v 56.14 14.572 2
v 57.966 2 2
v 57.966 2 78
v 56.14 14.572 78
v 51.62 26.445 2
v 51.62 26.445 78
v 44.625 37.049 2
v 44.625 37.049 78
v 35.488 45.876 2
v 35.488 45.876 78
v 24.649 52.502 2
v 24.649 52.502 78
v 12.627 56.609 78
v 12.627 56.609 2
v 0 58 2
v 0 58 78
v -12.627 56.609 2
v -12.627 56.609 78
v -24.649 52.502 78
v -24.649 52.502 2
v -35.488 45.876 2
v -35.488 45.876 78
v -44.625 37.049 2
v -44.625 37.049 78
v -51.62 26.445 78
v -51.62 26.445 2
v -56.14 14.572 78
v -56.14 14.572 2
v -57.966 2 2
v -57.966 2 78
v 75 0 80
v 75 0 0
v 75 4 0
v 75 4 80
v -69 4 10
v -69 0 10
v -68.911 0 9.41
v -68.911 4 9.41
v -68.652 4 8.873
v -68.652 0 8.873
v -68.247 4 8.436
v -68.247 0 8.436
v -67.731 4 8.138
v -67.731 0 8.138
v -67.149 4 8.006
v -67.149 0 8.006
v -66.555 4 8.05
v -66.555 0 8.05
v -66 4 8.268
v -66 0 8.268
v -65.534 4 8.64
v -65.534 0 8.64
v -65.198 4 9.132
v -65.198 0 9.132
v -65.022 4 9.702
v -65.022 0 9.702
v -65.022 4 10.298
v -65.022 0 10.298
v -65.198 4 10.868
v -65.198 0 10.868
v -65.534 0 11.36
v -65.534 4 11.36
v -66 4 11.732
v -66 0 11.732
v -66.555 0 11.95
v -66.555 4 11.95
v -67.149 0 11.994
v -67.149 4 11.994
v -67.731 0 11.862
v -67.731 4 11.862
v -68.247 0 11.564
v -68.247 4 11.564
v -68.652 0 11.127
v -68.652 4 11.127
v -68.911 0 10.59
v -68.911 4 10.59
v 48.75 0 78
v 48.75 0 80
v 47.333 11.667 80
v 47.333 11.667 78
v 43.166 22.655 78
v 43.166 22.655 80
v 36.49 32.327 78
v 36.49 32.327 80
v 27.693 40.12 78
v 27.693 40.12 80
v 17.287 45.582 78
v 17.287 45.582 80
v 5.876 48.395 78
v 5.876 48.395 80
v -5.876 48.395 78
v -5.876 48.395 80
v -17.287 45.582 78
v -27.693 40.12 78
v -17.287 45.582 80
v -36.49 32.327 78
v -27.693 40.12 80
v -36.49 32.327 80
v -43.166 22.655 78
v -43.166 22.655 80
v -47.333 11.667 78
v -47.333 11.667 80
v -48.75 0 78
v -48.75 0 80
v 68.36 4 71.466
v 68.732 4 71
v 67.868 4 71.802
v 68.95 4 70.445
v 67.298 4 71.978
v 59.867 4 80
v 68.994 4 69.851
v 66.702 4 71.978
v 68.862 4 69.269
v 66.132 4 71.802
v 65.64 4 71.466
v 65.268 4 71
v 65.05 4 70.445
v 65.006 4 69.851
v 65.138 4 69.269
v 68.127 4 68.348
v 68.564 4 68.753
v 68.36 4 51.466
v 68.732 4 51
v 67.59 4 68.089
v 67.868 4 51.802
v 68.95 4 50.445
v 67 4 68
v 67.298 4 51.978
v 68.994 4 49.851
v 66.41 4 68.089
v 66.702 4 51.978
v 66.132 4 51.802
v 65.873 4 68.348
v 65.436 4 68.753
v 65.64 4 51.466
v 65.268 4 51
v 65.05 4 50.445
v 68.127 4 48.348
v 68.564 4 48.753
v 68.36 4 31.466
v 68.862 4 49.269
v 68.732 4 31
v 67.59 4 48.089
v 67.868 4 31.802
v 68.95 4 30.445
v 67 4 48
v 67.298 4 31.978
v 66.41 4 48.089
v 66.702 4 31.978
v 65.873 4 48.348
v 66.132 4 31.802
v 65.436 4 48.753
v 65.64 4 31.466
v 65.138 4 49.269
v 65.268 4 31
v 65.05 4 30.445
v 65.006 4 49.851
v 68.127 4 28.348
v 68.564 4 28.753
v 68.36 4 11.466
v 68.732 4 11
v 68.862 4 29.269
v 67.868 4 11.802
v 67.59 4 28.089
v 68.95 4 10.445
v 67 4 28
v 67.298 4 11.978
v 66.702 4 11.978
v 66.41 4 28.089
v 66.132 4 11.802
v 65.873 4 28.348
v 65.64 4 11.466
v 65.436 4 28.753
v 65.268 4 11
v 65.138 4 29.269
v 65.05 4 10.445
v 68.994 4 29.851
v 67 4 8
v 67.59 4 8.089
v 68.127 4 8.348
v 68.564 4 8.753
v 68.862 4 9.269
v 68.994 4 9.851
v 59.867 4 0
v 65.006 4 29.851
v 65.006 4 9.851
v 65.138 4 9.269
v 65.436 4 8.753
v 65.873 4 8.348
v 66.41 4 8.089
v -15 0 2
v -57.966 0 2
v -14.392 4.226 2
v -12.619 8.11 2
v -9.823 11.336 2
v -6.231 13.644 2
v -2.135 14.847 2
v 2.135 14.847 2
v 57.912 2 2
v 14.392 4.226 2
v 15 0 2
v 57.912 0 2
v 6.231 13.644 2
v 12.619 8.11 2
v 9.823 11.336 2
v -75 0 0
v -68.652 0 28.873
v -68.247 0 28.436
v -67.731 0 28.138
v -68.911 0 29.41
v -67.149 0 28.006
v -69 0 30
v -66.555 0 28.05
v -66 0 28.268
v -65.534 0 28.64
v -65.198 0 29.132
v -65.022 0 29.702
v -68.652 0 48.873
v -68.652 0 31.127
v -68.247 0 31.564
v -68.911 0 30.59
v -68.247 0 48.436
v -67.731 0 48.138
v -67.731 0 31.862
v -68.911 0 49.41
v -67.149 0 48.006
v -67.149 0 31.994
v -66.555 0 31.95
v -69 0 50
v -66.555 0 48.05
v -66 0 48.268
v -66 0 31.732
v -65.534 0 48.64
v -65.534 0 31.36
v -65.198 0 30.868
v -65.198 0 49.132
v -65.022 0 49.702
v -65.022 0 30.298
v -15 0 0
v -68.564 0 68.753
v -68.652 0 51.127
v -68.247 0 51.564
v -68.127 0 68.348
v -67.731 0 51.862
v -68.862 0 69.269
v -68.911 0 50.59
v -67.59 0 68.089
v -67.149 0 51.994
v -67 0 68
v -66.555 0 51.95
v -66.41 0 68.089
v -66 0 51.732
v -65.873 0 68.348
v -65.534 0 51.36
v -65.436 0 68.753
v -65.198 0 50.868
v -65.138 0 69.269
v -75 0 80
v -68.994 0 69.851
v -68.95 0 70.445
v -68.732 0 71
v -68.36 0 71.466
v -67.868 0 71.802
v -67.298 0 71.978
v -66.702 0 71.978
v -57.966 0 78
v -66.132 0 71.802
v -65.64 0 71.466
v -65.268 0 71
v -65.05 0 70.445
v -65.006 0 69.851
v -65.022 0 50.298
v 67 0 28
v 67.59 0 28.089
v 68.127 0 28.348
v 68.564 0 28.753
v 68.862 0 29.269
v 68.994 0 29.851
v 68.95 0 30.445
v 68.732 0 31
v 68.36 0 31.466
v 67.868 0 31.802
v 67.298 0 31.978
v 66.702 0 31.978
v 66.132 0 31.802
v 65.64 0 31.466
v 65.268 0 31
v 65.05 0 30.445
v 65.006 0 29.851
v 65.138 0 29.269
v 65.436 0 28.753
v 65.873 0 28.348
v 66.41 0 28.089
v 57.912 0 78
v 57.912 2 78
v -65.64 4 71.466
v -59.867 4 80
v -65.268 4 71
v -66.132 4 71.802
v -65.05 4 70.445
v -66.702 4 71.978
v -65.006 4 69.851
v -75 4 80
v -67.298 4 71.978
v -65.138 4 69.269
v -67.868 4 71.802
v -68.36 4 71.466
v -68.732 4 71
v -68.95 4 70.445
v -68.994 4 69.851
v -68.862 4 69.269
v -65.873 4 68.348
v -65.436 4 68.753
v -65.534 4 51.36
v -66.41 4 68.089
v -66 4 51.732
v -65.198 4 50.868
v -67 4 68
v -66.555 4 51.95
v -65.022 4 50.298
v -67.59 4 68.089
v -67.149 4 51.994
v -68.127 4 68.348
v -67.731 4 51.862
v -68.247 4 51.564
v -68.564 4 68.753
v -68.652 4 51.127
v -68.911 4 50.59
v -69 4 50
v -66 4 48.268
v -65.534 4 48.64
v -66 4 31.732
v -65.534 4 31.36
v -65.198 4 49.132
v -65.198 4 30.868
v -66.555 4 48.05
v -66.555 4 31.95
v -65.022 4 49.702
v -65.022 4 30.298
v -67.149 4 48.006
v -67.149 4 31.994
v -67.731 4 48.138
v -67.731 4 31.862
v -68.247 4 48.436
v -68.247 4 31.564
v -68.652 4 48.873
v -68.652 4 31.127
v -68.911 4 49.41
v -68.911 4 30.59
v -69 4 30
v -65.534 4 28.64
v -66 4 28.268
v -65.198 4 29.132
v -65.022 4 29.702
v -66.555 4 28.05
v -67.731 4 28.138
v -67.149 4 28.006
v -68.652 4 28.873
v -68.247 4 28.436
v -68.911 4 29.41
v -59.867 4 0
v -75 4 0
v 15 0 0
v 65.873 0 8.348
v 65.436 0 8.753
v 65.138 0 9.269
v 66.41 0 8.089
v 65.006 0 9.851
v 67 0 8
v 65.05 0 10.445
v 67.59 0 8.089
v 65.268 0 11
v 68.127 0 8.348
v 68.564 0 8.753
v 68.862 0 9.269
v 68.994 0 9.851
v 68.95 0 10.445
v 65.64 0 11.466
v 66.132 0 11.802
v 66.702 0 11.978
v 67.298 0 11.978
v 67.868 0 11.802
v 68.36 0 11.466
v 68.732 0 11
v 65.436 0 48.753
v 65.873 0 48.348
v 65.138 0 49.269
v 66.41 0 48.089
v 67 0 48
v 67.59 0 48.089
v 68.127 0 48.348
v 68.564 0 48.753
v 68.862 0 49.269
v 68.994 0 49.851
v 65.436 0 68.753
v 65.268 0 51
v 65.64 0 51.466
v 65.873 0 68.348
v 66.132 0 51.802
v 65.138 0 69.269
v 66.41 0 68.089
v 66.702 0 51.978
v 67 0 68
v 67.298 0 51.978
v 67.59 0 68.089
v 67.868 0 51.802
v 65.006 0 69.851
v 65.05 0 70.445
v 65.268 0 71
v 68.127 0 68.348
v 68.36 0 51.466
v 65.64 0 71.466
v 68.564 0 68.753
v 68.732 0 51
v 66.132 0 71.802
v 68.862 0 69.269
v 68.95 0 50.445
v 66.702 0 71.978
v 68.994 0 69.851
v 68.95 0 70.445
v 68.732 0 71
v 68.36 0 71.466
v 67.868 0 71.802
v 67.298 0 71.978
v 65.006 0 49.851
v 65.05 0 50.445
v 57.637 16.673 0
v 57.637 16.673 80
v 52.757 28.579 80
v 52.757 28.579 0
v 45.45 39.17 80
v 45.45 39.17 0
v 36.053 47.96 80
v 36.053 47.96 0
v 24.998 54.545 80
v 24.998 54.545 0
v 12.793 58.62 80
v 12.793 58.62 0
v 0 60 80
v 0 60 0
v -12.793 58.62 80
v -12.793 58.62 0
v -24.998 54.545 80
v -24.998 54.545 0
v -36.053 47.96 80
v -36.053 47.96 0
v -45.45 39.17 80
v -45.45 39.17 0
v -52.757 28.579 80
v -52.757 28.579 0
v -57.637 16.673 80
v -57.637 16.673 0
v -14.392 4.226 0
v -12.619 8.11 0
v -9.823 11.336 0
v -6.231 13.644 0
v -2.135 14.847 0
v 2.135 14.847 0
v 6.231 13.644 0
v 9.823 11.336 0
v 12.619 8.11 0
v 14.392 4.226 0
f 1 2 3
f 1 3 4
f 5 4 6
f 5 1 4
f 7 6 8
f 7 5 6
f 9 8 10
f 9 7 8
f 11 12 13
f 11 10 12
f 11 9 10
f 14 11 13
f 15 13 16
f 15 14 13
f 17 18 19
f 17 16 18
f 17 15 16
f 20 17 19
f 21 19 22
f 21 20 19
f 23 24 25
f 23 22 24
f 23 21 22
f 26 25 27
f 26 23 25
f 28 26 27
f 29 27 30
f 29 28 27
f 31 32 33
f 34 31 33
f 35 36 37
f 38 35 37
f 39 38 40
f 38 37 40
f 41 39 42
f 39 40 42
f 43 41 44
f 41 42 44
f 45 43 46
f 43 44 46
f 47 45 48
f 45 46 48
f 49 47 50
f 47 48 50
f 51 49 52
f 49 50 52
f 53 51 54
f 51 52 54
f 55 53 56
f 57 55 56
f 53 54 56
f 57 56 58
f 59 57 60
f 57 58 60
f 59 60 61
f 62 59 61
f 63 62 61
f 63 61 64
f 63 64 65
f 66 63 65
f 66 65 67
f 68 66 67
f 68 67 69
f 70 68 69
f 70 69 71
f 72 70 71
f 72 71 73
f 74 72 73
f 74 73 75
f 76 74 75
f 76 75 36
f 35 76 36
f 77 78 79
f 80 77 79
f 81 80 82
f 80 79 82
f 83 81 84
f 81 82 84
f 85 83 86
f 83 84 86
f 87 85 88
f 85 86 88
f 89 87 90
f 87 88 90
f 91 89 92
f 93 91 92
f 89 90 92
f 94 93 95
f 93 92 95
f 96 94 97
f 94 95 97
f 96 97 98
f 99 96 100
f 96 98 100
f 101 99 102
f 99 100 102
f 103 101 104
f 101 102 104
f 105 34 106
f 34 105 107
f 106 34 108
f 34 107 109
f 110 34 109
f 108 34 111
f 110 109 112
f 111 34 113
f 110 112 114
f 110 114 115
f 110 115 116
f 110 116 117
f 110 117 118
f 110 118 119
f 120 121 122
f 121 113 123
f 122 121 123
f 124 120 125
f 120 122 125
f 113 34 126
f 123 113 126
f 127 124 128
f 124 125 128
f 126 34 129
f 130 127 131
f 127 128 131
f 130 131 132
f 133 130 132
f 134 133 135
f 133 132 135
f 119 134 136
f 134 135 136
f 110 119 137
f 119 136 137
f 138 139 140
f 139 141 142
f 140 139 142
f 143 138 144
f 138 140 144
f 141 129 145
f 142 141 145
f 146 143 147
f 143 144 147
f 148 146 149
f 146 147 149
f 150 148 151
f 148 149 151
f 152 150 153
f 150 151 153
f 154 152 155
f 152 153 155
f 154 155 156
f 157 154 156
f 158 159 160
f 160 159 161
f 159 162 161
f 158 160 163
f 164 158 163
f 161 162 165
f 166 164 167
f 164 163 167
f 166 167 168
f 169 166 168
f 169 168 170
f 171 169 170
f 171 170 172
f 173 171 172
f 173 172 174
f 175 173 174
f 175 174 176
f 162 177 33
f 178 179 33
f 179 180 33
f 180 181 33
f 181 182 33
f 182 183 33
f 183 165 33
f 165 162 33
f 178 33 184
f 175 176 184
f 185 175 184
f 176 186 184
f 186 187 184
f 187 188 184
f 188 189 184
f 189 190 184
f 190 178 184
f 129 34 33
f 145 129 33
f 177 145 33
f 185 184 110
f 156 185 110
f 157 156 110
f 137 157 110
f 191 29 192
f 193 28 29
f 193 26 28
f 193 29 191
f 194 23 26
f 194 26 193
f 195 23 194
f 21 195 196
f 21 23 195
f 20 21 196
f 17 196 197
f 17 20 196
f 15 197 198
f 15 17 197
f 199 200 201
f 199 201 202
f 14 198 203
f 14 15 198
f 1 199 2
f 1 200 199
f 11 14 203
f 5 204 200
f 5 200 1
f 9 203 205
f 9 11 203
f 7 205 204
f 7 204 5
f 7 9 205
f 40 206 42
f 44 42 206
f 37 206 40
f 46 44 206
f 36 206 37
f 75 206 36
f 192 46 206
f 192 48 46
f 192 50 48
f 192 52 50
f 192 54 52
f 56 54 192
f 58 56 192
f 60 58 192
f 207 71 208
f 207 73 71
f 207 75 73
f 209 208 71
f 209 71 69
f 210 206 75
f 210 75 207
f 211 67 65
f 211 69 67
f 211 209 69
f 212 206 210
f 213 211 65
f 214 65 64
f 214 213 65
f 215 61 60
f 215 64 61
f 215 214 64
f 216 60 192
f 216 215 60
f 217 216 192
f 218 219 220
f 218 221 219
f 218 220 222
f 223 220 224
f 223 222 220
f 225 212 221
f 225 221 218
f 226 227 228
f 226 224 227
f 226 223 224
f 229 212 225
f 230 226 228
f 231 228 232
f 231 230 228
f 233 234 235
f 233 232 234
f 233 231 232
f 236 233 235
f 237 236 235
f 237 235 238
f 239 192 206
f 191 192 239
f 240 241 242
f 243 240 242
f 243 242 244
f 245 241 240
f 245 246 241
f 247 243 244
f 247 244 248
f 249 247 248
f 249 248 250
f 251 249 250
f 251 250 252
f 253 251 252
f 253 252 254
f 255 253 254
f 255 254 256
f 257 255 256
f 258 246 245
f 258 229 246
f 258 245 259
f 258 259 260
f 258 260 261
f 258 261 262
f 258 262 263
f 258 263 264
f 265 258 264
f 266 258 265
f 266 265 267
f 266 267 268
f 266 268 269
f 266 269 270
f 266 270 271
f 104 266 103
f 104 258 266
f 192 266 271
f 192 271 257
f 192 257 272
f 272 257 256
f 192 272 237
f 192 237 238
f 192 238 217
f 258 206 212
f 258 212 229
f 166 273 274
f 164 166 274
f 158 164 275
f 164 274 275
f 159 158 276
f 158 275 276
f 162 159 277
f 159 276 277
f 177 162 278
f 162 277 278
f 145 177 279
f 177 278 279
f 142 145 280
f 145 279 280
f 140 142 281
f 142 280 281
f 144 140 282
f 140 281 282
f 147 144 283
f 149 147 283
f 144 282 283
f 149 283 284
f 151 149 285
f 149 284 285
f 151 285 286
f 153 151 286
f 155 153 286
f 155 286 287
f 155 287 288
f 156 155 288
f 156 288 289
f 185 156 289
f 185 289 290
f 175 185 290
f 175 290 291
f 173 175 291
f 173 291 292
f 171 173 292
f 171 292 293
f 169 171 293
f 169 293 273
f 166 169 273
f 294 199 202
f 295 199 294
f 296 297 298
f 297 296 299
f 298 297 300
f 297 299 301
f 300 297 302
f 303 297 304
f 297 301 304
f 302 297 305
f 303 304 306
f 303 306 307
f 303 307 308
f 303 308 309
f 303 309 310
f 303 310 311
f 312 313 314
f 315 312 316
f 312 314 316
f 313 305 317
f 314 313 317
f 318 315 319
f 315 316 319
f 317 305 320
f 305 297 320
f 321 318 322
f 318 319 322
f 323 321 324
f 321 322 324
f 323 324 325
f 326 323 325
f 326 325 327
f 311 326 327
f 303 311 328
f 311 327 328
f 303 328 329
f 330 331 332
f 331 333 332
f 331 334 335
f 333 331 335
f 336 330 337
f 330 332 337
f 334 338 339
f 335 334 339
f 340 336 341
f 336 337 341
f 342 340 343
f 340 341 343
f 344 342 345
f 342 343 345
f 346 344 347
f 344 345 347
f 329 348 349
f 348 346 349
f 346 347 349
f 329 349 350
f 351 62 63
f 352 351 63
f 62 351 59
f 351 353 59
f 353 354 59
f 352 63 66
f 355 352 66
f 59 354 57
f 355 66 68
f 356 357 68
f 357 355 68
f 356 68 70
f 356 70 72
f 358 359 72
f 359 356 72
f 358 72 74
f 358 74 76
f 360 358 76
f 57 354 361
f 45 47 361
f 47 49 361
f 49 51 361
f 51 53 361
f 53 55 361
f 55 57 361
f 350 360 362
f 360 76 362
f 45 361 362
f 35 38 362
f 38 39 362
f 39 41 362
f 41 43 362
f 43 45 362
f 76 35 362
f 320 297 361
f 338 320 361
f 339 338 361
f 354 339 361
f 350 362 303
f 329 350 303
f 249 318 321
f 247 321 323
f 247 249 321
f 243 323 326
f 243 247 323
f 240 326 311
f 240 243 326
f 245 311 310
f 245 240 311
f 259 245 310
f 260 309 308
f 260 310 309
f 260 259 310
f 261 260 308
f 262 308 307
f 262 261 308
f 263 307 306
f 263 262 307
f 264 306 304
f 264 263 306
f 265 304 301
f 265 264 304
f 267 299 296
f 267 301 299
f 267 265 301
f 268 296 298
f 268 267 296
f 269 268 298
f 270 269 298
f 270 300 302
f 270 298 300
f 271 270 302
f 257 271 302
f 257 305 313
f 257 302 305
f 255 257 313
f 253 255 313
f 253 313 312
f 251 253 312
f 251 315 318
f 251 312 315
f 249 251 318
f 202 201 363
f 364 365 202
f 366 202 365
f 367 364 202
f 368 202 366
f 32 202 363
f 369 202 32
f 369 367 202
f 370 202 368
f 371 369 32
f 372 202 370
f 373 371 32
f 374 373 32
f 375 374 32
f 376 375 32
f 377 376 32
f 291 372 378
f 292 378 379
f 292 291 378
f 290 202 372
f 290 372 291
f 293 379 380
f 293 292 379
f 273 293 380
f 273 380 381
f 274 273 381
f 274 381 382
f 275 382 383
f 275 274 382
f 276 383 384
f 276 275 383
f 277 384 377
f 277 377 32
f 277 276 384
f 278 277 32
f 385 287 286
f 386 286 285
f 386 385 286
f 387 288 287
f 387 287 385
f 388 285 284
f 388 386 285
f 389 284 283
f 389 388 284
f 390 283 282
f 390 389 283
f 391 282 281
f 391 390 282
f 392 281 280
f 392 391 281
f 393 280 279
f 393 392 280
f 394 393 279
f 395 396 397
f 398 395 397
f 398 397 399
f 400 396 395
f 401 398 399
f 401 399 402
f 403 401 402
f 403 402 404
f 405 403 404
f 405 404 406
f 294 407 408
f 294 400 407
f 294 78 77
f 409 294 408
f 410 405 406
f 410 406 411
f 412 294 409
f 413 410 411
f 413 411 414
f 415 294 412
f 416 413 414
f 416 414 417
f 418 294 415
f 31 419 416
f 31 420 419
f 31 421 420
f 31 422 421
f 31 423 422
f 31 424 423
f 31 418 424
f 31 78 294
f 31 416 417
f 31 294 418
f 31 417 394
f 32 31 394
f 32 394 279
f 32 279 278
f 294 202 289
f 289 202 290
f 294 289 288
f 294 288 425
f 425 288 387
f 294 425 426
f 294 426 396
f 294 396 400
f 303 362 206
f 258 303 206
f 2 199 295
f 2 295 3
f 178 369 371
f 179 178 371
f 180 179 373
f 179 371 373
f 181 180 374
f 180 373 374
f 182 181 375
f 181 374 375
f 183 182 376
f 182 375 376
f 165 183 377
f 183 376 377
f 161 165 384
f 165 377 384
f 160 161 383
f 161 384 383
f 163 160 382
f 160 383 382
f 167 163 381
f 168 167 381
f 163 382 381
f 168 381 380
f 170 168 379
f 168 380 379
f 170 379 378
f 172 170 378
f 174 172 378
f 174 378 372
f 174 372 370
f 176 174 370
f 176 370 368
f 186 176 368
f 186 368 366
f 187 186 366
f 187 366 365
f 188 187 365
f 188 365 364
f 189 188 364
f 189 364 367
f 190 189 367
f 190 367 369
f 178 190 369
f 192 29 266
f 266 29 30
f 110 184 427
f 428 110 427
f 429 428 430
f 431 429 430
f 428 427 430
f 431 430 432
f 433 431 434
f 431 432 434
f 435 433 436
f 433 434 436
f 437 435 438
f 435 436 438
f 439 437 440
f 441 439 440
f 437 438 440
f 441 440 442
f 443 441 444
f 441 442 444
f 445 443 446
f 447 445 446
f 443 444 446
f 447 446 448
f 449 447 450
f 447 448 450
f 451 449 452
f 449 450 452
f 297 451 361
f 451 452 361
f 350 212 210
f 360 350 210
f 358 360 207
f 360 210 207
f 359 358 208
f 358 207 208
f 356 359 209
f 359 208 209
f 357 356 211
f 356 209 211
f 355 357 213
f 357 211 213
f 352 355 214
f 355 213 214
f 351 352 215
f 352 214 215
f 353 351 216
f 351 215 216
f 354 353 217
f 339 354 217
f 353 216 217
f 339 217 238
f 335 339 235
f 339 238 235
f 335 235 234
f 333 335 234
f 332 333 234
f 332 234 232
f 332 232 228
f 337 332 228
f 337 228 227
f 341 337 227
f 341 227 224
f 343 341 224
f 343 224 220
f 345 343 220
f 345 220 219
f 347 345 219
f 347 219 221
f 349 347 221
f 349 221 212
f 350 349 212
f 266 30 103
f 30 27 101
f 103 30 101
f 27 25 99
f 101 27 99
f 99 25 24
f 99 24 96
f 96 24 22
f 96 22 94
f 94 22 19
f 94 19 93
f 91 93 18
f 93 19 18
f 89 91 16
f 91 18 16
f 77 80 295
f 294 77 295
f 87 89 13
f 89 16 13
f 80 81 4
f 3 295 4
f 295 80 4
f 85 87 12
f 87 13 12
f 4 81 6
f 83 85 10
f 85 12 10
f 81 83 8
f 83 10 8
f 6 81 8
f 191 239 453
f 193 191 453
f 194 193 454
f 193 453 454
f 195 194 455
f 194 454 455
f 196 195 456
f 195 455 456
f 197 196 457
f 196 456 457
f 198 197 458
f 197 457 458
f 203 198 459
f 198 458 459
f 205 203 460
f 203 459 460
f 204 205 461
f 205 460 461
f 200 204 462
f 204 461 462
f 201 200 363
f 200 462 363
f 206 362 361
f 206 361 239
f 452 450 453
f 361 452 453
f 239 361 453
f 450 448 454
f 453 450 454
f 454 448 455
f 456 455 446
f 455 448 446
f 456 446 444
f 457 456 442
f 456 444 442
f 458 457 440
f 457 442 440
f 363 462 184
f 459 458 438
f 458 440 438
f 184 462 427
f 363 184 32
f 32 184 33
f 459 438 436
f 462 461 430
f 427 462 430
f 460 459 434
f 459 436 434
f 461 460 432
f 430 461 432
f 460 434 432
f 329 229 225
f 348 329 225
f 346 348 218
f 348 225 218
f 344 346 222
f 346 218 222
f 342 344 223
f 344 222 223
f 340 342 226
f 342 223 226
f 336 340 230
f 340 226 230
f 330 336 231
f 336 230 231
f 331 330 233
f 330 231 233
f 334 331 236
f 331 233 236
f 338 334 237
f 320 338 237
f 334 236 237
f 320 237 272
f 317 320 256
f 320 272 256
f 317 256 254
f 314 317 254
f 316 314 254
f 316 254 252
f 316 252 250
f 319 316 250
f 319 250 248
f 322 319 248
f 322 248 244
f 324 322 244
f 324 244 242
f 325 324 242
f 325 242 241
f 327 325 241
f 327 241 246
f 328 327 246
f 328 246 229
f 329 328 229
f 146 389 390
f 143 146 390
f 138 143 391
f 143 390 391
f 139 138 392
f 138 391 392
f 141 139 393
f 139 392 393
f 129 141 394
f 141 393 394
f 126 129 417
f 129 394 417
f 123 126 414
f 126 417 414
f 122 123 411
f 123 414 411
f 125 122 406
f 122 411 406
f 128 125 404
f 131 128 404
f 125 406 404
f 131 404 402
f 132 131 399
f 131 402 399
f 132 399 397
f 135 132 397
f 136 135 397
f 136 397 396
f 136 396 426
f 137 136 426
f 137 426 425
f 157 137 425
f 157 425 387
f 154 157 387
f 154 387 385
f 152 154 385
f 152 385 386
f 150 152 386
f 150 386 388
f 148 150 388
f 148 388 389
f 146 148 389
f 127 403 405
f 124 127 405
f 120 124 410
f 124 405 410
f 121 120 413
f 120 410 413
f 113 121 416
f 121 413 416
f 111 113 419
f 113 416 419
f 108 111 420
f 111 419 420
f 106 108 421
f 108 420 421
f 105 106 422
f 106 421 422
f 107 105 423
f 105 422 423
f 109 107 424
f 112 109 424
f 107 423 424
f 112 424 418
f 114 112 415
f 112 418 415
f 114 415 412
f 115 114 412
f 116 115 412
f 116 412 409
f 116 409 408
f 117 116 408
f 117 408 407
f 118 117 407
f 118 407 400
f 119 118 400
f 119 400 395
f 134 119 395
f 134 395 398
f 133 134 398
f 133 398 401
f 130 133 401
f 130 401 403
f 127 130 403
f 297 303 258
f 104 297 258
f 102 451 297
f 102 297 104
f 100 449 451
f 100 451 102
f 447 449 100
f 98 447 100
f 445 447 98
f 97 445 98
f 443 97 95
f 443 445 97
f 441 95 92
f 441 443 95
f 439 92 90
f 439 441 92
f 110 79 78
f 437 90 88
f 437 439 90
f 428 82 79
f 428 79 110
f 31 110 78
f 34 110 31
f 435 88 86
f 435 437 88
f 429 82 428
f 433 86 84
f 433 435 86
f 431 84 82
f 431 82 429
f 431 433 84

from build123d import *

# Parameters (mm, degrees)
BOSS_EXTRUDE1_DEPTH     = 80
SHELL1_T                = -2
SKETCH2_W               = 15.034493015
SKETCH2_H               = 76
SKETCH2_W_2             = 15.087666062
BOSS_EXTRUDE2_DEPTH     = 2
CUT_EXTRUDE1_REACH      = 82
CUT_EXTRUDE2_REACH      = 82
SKETCH6_R               = 2
CUT_EXTRUDE6_DEPTH      = 61
LPATTERN1_COUNT         = 4
LPATTERN1_PITCH         = 20
MIRROR1_COPY_1_SKETCH_R = 2
MIRROR1_COPY_1_DEPTH    = 61
MIRROR1_COPY_2_SKETCH_R = 2
MIRROR1_COPY_2_DEPTH    = 61
MIRROR1_COPY_3_SKETCH_R = 2
MIRROR1_COPY_3_DEPTH    = 61


with BuildPart() as part:
    # Sketch1 → Boss-Extrude1 (new body)
    with BuildSketch(Plane.XY):
        with BuildLine():
            Line((-75, 0), (75, 0))
            Line((75, 0), (75, 4))
            Line((75, 4), (59.866518188, 4))
            ThreePointArc((59.866518188, 4), (0, 60), (-59.866518188, 4))
            Line((-59.866518188, 4), (-75, 4))
            Line((-75, 4), (-75, 0))
        make_face()
    extrude(amount=BOSS_EXTRUDE1_DEPTH)

    # Shell1
    shell1_openings = [part.faces().sort_by_distance(p)[0] for p in [
        (0, 0, 40),
    ]]
    offset(amount=SHELL1_T, openings=shell1_openings, kind=Kind.INTERSECTION)

    # Sketch2 → Boss-Extrude2 (add)
    with BuildSketch(Plane.XZ.offset(-2)):
        with Locations((-65.482753492, 40)):
            Rectangle(SKETCH2_W, SKETCH2_H)
        with Locations((65.456166969, 40)):
            Rectangle(SKETCH2_W_2, SKETCH2_H)
    extrude(amount=BOSS_EXTRUDE2_DEPTH)

    # Sketch3 → Cut-Extrude1 (cut, up to next)
    with BuildSketch(Plane.XY.offset(80), mode=Mode.PRIVATE) as cut_extrude1_sk1:
        with BuildLine():
            Line((-48.75, 0), (48.75, 0))
            ThreePointArc((48.75, 0), (0, 48.75), (-48.75, 0))
        make_face()
    cut_extrude1_tool1 = extrude(cut_extrude1_sk1.sketch, amount=-CUT_EXTRUDE1_REACH, mode=Mode.PRIVATE) & part.part
    add(cut_extrude1_tool1.solids().sort_by_distance((0, 20.690143, 80))[0], mode=Mode.SUBTRACT)

    # Sketch5 → Cut-Extrude2 (cut, up to next)
    with BuildSketch(Plane(origin=(0, 0, 0), x_dir=(-1, 0, 0), z_dir=(0, 0, -1)), mode=Mode.PRIVATE) as cut_extrude2_sk1:
        with BuildLine():
            Line((-15, 0), (15, 0))
            ThreePointArc((15, 0), (0, 15), (-15, 0))
        make_face()
    cut_extrude2_tool1 = extrude(cut_extrude2_sk1.sketch, amount=-CUT_EXTRUDE2_REACH, mode=Mode.PRIVATE) & part.part
    add(cut_extrude2_tool1.solids().sort_by_distance((0, 6.366198, 0))[0], mode=Mode.SUBTRACT)

    # Sketch6 → Cut-Extrude6 (cut, through all)
    with BuildSketch(Plane.XZ):
        with Locations(Location((67, 70, 0), (0, 0, 270))):  # turned: the seam where the file's is
            Circle(SKETCH6_R)
    cut_extrude6 = extrude(amount=-CUT_EXTRUDE6_DEPTH, mode=Mode.SUBTRACT)

    # LPattern1: Cut-Extrude6 ×4
    with Locations(*[(0, 0, -i * LPATTERN1_PITCH) for i in range(1, LPATTERN1_COUNT)]):
        add(cut_extrude6, mode=Mode.SUBTRACT)

    # Mirror1: Cut-Extrude6 across plane
    add(cut_extrude6.mirror(Plane(origin=(0, 0, 0), x_dir=(0, 0, 1), z_dir=(1, 0, 0))), mode=Mode.SUBTRACT)

    # Mirror1 copy 1 sketch → Mirror1 copy 1 (cut, through all)
    with BuildSketch(Plane(origin=(0, 0, -20), x_dir=(-1, 0, 0), z_dir=(0, -1, 0))):
        with Locations((67, -70)):
            Circle(MIRROR1_COPY_1_SKETCH_R)
    extrude(amount=-MIRROR1_COPY_1_DEPTH, mode=Mode.SUBTRACT)

    # Mirror1 copy 2 sketch → Mirror1 copy 2 (cut, through all)
    with BuildSketch(Plane(origin=(0, 0, -40), x_dir=(-1, 0, 0), z_dir=(0, -1, 0))):
        with Locations((67, -70)):
            Circle(MIRROR1_COPY_2_SKETCH_R)
    extrude(amount=-MIRROR1_COPY_2_DEPTH, mode=Mode.SUBTRACT)

    # Mirror1 copy 3 sketch → Mirror1 copy 3 (cut, through all)
    with BuildSketch(Plane(origin=(0, 0, -60), x_dir=(-1, 0, 0), z_dir=(0, -1, 0))):
        with Locations((67, -70)):
            Circle(MIRROR1_COPY_3_SKETCH_R)
    extrude(amount=-MIRROR1_COPY_3_DEPTH, mode=Mode.SUBTRACT)


solid = part.part
